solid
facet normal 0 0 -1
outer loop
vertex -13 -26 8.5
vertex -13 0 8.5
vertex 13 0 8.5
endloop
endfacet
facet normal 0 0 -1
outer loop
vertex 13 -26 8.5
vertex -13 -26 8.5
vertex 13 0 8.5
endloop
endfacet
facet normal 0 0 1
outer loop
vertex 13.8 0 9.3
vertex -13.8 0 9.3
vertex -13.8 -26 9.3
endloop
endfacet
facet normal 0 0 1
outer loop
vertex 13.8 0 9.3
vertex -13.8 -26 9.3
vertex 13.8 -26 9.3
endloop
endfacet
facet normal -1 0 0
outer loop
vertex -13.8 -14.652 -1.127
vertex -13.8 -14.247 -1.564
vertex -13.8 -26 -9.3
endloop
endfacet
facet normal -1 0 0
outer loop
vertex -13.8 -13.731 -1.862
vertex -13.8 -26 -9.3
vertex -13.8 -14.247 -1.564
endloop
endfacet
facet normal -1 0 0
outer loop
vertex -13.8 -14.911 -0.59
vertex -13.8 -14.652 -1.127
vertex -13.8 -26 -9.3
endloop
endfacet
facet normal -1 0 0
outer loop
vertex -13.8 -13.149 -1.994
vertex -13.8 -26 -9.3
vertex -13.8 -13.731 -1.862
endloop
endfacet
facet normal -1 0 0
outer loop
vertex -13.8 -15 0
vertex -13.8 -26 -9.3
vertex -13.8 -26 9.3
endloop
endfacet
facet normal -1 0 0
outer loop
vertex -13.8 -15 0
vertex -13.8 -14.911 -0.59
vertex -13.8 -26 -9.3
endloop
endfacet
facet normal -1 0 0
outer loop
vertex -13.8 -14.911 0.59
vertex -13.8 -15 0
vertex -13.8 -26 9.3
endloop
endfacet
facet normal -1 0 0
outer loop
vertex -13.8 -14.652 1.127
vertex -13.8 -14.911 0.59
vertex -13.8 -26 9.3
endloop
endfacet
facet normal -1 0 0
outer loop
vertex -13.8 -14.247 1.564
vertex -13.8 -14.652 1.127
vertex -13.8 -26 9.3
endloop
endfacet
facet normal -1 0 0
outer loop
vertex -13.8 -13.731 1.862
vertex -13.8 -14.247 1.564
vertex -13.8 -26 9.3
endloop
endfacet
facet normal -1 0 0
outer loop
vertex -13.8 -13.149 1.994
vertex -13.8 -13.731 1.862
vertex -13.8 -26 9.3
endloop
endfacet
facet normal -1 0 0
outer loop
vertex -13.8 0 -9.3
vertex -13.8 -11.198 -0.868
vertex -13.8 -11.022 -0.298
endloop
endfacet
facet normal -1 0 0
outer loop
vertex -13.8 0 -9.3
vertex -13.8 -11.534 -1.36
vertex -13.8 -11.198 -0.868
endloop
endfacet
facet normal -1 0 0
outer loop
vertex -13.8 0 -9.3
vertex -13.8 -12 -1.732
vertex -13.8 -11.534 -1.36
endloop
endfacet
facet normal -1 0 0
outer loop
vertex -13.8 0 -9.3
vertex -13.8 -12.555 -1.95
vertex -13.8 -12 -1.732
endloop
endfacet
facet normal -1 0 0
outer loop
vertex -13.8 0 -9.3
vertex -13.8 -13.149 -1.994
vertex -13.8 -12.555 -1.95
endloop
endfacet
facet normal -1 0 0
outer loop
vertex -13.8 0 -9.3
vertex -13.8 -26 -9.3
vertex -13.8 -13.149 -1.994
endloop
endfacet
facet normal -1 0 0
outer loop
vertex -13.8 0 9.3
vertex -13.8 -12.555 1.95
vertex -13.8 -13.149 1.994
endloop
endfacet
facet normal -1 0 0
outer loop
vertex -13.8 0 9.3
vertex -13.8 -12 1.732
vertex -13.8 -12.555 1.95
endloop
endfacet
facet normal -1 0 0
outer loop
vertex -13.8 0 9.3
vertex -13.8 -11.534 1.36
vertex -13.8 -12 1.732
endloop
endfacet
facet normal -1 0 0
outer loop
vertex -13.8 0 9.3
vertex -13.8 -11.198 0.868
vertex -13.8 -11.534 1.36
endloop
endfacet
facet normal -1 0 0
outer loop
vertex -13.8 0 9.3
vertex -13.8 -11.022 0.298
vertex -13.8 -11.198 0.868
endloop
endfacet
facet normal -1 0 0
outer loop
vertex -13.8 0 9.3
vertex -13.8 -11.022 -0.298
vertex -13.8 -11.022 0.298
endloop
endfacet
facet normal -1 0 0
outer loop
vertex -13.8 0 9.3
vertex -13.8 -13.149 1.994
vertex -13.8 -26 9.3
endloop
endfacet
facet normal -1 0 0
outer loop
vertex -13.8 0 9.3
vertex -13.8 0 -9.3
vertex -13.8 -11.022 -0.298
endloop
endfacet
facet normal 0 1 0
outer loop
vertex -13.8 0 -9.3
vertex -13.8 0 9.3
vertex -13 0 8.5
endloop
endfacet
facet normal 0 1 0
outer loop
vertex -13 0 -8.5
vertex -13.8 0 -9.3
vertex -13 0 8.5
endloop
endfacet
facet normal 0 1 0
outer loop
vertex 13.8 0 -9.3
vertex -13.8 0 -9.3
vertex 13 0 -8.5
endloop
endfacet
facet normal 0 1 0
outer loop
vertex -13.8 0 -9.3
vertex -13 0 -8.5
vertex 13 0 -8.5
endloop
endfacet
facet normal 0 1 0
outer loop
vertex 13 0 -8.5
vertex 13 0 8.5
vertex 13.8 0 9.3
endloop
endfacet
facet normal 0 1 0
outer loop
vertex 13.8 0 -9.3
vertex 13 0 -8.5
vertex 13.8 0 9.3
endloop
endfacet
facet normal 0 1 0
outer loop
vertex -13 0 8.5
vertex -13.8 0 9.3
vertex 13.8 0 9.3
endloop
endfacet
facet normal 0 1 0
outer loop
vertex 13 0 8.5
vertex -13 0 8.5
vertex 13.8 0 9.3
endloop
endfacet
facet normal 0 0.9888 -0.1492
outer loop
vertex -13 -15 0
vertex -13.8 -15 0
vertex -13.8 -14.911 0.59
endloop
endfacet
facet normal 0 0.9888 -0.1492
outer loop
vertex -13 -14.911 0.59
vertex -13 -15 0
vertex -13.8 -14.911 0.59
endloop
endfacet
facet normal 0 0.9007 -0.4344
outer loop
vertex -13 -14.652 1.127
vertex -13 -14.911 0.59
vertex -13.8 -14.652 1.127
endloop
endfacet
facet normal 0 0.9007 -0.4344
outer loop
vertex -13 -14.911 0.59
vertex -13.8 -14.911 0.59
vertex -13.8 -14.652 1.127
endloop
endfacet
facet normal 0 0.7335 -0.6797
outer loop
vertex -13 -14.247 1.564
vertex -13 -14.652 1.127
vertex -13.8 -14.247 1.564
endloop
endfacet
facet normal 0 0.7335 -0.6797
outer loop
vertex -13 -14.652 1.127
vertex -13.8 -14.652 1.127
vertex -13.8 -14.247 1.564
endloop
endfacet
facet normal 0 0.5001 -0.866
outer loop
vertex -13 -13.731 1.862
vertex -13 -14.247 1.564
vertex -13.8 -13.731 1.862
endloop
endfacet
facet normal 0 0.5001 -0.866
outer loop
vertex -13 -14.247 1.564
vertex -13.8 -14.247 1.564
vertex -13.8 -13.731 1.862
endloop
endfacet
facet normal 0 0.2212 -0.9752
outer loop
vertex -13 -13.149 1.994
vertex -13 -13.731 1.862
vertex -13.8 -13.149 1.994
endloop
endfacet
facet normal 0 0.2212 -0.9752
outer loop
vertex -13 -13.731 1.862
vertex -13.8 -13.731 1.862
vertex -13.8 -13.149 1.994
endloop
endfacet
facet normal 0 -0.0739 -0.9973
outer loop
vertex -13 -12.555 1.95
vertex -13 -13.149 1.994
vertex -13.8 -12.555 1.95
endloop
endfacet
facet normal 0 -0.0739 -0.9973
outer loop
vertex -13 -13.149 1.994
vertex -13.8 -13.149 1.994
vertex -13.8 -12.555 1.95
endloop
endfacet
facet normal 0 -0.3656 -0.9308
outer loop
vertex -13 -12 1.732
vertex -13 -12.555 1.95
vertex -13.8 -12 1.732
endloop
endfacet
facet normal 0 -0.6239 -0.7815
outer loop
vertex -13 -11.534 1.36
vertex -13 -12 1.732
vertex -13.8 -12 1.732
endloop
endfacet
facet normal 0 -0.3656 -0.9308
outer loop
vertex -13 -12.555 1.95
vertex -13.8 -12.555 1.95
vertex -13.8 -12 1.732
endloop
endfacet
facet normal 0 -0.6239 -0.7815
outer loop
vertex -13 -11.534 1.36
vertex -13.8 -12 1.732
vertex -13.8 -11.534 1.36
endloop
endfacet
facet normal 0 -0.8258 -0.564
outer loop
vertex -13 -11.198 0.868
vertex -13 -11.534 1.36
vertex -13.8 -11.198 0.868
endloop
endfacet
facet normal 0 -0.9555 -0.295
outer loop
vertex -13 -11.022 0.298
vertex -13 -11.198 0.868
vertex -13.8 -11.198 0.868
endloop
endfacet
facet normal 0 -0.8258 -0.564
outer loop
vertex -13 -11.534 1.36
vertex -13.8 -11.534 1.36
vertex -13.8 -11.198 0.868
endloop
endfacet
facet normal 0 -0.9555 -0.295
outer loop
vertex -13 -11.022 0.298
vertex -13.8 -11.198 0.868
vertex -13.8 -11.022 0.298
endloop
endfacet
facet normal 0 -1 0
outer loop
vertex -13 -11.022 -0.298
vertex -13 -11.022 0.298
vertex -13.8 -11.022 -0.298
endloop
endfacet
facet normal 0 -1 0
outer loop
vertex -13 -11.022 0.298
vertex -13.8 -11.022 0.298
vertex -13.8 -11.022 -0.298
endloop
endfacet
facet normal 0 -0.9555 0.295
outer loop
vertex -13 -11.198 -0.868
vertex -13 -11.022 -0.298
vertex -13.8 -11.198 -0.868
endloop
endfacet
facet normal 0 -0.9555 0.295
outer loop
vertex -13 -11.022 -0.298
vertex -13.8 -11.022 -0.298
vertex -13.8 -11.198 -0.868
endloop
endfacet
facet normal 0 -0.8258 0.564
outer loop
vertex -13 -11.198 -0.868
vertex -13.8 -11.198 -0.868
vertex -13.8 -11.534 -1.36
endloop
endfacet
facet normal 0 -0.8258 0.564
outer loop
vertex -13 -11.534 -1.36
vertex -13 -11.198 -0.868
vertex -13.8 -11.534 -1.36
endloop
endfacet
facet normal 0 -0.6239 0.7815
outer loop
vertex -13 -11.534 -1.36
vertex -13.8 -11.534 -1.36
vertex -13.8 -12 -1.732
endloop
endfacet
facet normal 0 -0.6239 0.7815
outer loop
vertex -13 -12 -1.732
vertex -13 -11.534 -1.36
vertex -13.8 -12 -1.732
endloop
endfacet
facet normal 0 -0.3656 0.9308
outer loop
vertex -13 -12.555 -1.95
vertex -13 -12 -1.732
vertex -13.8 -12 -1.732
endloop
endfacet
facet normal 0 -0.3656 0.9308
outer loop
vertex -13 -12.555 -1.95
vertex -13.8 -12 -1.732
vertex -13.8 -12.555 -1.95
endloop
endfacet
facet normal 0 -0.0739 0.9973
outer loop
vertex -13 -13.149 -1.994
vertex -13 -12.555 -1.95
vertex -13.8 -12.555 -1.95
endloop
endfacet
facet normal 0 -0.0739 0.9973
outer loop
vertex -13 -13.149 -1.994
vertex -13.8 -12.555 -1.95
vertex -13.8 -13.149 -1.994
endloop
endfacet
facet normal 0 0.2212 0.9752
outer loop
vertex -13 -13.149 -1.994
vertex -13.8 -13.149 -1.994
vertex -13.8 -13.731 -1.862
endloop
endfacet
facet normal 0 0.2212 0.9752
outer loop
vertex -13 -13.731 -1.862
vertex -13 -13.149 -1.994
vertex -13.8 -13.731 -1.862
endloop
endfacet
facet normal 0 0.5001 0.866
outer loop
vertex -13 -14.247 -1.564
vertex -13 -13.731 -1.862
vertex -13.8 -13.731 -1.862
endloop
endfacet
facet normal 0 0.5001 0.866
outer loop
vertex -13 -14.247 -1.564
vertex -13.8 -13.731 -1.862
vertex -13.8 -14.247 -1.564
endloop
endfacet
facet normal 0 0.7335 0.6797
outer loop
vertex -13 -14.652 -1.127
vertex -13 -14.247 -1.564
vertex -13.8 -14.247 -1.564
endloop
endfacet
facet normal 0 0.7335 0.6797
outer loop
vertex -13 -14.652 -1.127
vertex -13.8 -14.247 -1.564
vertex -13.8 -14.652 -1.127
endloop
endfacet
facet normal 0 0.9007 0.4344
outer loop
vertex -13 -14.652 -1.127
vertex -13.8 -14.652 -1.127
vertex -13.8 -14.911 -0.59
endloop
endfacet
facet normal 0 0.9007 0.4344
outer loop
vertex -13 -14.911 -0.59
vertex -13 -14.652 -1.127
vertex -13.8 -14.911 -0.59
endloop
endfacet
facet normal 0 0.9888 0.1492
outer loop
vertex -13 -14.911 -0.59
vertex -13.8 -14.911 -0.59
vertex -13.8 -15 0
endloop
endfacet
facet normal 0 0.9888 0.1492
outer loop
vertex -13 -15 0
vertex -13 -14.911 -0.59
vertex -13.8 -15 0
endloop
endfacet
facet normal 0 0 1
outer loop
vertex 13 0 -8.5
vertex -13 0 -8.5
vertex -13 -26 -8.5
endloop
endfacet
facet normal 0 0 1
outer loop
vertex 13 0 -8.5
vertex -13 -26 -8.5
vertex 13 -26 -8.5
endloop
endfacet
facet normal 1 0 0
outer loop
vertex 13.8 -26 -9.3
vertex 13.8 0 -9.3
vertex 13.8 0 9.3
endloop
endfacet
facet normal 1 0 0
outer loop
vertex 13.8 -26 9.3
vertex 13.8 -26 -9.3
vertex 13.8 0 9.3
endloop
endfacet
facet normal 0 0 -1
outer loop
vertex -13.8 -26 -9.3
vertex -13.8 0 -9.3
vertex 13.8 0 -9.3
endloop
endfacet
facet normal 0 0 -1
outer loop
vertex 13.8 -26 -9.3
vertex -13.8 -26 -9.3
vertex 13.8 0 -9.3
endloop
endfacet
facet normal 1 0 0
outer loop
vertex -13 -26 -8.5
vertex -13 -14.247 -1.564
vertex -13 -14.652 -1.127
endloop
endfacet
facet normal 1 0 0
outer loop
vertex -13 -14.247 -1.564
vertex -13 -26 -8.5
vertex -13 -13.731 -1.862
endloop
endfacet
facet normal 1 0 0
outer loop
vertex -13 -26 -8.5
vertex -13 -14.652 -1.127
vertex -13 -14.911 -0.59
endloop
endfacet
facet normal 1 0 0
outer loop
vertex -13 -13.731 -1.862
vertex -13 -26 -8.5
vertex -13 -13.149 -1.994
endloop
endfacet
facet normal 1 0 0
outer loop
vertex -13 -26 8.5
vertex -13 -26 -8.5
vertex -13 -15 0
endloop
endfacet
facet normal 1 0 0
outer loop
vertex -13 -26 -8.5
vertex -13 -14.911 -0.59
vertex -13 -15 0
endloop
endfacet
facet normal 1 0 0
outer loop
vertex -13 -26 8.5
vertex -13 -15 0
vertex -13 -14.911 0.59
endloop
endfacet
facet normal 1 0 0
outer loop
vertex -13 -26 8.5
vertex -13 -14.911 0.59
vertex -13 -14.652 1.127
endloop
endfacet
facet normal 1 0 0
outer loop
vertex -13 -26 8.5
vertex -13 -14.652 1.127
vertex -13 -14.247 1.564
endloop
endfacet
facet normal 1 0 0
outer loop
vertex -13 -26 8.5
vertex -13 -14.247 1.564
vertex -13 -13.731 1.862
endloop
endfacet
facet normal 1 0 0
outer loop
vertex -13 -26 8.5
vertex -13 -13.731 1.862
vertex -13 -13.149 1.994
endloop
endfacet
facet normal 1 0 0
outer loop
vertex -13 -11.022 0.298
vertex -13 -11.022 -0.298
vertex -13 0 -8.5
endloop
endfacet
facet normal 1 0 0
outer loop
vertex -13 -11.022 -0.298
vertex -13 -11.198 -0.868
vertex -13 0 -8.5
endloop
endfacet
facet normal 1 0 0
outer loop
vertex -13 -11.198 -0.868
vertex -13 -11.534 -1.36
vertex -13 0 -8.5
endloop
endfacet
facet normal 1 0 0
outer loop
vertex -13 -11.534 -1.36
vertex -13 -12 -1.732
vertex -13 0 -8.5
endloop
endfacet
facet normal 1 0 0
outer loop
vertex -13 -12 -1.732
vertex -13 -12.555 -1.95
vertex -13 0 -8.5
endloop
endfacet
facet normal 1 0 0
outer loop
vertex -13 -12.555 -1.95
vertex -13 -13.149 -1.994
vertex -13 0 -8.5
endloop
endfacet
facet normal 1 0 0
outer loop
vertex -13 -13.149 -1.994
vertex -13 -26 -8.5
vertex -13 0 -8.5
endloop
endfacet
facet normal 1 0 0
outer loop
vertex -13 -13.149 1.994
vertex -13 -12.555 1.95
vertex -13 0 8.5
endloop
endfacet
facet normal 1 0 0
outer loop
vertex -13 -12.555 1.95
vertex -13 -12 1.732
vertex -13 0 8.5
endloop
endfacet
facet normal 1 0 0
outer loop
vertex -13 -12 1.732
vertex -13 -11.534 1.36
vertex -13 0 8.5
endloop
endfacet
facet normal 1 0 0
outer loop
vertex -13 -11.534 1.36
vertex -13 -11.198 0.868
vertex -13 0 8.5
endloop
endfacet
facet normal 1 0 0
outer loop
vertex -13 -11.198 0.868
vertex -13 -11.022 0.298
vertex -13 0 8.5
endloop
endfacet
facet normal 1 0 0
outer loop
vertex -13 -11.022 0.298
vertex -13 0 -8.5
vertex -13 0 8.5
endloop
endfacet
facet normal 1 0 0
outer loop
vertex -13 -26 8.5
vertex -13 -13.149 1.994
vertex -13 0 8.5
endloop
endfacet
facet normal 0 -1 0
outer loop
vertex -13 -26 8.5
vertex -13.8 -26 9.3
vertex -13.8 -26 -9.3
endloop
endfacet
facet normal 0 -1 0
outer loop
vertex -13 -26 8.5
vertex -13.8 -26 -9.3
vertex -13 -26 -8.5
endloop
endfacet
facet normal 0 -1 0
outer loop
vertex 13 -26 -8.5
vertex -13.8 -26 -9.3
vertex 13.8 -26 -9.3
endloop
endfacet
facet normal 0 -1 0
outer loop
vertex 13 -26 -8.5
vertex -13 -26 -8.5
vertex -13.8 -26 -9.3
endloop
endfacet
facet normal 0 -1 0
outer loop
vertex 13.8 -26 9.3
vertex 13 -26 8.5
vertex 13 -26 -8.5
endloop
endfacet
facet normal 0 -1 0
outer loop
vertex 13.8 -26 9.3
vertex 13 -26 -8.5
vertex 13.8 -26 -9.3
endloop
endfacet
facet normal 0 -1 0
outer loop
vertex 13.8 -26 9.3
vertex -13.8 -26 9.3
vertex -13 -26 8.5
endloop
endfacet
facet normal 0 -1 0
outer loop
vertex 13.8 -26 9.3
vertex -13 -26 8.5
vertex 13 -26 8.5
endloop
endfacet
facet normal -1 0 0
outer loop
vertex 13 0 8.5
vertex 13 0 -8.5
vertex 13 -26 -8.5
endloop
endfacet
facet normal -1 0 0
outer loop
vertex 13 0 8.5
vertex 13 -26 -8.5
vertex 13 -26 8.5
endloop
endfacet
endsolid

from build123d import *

# Parameters (mm, degrees)
F0_W     = 27.6
F0_H     = 18.6
F0_W_2   = 26
F0_H_2   = 17
F1_DEPTH = 26
F2_R     = 2
F3_DEPTH = 3


with BuildPart() as f1:
    # F0 (on Front) → F1 (new body)
    with BuildSketch(Plane.XZ):
        Rectangle(F0_W, F0_H)
        Rectangle(F0_W_2, F0_H_2, mode=Mode.SUBTRACT)
    extrude(amount=F1_DEPTH)

    # F2 (on face) → F3 (cut)
    with BuildSketch(Plane(origin=(-13.8, 0, 0), x_dir=(0, -1, 0), z_dir=(-1, 0, 0))):
        with Locations((13, 0)):
            Circle(F2_R)
    extrude(amount=-F3_DEPTH, mode=Mode.SUBTRACT)


solid = f1.part
